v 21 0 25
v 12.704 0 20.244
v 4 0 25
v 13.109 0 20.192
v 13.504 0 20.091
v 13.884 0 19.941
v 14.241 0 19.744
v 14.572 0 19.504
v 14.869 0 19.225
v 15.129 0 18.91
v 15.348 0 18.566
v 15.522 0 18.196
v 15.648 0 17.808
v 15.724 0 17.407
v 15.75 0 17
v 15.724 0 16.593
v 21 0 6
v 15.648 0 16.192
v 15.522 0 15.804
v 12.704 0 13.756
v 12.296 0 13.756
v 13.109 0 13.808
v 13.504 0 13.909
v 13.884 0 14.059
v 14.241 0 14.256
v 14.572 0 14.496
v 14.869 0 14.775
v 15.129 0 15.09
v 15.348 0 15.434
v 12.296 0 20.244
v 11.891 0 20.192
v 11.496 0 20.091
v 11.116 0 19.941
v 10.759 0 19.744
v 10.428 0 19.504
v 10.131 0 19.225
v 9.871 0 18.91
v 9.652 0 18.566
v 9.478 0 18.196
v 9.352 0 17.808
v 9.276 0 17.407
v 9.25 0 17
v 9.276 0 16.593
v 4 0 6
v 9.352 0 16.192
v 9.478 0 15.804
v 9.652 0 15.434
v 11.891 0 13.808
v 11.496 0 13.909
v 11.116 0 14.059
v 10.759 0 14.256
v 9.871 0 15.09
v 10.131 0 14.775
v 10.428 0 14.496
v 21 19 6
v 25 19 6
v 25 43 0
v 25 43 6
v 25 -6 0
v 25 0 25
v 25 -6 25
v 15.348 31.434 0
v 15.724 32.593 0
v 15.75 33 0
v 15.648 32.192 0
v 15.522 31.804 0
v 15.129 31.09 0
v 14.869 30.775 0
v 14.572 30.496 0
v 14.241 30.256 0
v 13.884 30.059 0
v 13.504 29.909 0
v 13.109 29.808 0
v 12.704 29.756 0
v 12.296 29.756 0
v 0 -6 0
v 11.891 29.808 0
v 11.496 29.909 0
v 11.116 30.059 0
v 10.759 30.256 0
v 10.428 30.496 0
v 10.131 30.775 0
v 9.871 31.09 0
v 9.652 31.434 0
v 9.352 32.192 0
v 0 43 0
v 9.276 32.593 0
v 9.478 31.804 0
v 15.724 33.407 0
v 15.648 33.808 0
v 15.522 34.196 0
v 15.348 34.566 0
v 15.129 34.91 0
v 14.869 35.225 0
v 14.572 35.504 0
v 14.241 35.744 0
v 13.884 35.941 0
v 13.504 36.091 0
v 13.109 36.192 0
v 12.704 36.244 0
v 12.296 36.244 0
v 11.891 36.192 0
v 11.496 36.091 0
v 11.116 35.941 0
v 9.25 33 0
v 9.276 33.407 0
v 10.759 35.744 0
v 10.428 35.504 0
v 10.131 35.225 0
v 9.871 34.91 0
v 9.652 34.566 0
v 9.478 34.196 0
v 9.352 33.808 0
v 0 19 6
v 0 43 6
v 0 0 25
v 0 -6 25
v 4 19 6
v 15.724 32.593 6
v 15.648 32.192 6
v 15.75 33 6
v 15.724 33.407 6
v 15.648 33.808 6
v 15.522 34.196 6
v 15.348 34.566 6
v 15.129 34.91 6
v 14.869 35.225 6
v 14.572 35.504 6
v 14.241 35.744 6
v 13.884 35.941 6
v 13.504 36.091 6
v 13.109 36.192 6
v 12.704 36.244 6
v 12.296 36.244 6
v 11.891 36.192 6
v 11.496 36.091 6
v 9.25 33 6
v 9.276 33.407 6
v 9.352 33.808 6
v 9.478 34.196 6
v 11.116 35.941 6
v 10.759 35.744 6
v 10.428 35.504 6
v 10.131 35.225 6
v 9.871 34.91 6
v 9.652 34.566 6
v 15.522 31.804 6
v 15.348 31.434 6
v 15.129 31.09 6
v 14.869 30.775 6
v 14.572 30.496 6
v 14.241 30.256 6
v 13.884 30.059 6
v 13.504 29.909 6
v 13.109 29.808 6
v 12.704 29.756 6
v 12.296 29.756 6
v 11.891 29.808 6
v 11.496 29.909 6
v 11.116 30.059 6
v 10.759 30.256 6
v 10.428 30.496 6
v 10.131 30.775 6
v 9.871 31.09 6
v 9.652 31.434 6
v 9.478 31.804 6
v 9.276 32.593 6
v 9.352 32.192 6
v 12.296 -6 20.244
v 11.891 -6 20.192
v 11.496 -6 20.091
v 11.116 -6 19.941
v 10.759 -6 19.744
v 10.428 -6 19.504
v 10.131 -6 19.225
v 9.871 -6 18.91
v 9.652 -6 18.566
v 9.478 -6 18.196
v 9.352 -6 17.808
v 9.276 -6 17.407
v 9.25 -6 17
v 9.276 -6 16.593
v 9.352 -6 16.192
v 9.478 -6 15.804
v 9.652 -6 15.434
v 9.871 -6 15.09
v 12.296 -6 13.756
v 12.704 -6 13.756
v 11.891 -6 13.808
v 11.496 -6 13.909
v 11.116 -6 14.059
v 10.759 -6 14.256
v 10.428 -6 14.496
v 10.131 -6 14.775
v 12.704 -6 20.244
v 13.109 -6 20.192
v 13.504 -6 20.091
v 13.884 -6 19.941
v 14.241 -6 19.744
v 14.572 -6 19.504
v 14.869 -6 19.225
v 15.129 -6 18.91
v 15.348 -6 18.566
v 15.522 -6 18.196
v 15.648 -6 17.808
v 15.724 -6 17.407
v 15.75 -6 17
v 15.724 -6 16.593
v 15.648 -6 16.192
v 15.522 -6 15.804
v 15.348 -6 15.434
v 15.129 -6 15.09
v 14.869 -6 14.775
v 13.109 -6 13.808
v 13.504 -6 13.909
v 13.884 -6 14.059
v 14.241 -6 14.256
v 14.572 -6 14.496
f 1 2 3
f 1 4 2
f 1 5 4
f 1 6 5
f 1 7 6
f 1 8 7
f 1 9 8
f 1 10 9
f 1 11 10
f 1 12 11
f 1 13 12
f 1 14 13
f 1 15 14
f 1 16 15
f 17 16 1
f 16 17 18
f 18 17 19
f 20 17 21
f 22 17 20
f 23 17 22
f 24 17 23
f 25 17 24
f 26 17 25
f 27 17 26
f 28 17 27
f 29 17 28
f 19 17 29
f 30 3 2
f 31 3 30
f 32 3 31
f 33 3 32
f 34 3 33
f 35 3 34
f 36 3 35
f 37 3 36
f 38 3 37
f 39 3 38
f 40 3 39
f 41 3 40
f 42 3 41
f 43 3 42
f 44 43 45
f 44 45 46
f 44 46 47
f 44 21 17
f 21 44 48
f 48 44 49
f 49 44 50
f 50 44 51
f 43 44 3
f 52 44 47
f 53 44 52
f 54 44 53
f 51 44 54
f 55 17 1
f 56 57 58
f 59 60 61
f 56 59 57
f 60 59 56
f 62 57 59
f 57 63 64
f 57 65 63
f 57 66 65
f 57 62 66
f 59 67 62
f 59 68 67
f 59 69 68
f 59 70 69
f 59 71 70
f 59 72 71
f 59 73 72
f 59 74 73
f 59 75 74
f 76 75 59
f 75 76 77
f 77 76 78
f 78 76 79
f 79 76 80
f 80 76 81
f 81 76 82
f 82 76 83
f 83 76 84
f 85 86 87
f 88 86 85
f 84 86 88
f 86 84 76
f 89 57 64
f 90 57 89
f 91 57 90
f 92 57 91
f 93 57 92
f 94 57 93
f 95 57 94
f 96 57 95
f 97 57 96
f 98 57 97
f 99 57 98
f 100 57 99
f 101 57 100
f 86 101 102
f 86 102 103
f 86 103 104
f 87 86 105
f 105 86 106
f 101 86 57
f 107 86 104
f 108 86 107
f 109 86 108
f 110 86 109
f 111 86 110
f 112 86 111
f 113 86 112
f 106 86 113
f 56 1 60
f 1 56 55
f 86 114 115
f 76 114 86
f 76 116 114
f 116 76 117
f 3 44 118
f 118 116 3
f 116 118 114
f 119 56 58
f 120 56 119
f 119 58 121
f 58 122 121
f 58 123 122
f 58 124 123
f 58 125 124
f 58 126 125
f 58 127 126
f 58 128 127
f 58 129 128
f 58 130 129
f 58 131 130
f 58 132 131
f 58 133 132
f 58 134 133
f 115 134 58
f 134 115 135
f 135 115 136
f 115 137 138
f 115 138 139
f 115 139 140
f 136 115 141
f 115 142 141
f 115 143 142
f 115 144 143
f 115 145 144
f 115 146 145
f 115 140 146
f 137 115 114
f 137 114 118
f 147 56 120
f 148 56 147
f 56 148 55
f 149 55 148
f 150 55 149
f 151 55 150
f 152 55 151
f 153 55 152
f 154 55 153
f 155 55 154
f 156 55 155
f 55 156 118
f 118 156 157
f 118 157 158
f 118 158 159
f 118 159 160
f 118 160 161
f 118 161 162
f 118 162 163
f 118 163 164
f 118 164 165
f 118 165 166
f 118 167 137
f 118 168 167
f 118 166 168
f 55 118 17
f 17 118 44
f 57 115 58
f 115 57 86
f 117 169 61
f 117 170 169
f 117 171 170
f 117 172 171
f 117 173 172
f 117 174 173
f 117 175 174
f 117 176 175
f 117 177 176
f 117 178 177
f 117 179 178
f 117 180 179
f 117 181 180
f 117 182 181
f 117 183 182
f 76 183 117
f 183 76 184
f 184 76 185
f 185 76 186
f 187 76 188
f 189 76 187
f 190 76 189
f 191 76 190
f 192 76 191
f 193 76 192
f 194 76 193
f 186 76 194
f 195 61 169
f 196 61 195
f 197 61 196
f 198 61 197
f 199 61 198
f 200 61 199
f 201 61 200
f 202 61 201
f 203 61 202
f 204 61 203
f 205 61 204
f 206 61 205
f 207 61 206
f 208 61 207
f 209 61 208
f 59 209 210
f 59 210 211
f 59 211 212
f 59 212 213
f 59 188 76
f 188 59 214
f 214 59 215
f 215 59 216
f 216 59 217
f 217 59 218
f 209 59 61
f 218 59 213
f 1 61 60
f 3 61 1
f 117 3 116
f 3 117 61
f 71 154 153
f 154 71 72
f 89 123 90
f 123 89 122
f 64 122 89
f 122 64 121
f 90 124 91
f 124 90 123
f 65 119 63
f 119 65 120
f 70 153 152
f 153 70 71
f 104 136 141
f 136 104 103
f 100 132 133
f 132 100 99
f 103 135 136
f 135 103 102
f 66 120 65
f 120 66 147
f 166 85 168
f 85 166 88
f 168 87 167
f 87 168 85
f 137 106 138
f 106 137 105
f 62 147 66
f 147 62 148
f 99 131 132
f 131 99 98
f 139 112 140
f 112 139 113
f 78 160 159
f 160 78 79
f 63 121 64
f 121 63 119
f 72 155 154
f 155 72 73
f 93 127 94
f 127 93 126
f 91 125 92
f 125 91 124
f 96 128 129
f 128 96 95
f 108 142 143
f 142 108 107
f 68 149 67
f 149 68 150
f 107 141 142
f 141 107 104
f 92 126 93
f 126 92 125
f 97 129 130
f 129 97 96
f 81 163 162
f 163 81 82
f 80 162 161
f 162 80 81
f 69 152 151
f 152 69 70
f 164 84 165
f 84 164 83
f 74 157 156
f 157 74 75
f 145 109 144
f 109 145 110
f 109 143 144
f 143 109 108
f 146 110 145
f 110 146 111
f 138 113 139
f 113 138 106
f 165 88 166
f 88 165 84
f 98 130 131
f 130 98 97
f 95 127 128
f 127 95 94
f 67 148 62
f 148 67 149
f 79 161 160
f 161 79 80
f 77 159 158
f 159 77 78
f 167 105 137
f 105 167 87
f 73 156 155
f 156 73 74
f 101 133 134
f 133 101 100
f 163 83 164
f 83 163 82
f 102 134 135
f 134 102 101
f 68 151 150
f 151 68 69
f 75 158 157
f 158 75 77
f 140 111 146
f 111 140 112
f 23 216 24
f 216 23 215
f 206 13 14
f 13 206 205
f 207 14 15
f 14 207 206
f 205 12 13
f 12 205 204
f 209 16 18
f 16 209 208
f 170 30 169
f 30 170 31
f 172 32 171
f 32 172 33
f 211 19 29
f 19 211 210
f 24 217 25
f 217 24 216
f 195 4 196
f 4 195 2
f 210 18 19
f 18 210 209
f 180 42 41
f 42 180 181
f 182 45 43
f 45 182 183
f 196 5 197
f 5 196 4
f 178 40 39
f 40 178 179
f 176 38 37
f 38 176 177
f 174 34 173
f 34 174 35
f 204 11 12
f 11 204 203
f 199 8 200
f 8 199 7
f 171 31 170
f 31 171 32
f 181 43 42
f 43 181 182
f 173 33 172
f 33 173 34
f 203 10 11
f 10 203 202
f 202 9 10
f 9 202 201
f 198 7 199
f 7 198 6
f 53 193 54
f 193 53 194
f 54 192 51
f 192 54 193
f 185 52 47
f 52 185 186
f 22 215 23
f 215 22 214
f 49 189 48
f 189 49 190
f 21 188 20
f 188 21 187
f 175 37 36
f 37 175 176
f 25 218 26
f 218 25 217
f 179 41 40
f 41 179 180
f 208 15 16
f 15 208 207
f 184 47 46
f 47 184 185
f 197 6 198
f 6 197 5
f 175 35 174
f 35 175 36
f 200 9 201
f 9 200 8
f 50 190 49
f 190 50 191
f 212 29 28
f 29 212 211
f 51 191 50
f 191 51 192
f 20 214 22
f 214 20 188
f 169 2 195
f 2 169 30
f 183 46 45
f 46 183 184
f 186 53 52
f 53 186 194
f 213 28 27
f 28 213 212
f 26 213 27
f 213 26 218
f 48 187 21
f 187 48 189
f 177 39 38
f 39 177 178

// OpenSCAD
// thickness of braces
bracethick=4;  
// width of clamp
width=25;  
// length of clamp
length=43;  
// clamp thickness
clampthick=6;  
// offset of hole from edge
holeoffset=10;  
// radius of hole
holeradius=3.25; 
// hole #2 offset (-1 for no hole)
hole2offset=8; 
// radius of hole 2
hole2radius=3.25; 

$fn=50-0;  // round holes please

bracesize=width;  // brace width and height


module brace() {
    rotate([90,0,-90,])difference() {
        cube([bracesize,bracesize,bracethick]);
    rotate([0,0,45])
        translate([0,0,-1]) cube([2*bracesize,2*bracesize,bracethick*2]);
    }
}



difference() {
union() {
     cube([width,length,clampthick]);
    rotate([90,0,0])
      cube([width,width,clampthick]);
    translate([width,bracesize,0]) brace();
    translate([bracethick,bracesize,0])
    brace();   
   }
translate([width/2,
   length-holeoffset,-1])  
   cylinder(r=holeradius,h=clampthick*10);
    if (hole2offset>=0)
    {
        translate([width/2,1,width-hole2offset])
rotate ([90,0,0]) 
        
        cylinder(r=hole2radius,h=clampthick*10);
    }
}
